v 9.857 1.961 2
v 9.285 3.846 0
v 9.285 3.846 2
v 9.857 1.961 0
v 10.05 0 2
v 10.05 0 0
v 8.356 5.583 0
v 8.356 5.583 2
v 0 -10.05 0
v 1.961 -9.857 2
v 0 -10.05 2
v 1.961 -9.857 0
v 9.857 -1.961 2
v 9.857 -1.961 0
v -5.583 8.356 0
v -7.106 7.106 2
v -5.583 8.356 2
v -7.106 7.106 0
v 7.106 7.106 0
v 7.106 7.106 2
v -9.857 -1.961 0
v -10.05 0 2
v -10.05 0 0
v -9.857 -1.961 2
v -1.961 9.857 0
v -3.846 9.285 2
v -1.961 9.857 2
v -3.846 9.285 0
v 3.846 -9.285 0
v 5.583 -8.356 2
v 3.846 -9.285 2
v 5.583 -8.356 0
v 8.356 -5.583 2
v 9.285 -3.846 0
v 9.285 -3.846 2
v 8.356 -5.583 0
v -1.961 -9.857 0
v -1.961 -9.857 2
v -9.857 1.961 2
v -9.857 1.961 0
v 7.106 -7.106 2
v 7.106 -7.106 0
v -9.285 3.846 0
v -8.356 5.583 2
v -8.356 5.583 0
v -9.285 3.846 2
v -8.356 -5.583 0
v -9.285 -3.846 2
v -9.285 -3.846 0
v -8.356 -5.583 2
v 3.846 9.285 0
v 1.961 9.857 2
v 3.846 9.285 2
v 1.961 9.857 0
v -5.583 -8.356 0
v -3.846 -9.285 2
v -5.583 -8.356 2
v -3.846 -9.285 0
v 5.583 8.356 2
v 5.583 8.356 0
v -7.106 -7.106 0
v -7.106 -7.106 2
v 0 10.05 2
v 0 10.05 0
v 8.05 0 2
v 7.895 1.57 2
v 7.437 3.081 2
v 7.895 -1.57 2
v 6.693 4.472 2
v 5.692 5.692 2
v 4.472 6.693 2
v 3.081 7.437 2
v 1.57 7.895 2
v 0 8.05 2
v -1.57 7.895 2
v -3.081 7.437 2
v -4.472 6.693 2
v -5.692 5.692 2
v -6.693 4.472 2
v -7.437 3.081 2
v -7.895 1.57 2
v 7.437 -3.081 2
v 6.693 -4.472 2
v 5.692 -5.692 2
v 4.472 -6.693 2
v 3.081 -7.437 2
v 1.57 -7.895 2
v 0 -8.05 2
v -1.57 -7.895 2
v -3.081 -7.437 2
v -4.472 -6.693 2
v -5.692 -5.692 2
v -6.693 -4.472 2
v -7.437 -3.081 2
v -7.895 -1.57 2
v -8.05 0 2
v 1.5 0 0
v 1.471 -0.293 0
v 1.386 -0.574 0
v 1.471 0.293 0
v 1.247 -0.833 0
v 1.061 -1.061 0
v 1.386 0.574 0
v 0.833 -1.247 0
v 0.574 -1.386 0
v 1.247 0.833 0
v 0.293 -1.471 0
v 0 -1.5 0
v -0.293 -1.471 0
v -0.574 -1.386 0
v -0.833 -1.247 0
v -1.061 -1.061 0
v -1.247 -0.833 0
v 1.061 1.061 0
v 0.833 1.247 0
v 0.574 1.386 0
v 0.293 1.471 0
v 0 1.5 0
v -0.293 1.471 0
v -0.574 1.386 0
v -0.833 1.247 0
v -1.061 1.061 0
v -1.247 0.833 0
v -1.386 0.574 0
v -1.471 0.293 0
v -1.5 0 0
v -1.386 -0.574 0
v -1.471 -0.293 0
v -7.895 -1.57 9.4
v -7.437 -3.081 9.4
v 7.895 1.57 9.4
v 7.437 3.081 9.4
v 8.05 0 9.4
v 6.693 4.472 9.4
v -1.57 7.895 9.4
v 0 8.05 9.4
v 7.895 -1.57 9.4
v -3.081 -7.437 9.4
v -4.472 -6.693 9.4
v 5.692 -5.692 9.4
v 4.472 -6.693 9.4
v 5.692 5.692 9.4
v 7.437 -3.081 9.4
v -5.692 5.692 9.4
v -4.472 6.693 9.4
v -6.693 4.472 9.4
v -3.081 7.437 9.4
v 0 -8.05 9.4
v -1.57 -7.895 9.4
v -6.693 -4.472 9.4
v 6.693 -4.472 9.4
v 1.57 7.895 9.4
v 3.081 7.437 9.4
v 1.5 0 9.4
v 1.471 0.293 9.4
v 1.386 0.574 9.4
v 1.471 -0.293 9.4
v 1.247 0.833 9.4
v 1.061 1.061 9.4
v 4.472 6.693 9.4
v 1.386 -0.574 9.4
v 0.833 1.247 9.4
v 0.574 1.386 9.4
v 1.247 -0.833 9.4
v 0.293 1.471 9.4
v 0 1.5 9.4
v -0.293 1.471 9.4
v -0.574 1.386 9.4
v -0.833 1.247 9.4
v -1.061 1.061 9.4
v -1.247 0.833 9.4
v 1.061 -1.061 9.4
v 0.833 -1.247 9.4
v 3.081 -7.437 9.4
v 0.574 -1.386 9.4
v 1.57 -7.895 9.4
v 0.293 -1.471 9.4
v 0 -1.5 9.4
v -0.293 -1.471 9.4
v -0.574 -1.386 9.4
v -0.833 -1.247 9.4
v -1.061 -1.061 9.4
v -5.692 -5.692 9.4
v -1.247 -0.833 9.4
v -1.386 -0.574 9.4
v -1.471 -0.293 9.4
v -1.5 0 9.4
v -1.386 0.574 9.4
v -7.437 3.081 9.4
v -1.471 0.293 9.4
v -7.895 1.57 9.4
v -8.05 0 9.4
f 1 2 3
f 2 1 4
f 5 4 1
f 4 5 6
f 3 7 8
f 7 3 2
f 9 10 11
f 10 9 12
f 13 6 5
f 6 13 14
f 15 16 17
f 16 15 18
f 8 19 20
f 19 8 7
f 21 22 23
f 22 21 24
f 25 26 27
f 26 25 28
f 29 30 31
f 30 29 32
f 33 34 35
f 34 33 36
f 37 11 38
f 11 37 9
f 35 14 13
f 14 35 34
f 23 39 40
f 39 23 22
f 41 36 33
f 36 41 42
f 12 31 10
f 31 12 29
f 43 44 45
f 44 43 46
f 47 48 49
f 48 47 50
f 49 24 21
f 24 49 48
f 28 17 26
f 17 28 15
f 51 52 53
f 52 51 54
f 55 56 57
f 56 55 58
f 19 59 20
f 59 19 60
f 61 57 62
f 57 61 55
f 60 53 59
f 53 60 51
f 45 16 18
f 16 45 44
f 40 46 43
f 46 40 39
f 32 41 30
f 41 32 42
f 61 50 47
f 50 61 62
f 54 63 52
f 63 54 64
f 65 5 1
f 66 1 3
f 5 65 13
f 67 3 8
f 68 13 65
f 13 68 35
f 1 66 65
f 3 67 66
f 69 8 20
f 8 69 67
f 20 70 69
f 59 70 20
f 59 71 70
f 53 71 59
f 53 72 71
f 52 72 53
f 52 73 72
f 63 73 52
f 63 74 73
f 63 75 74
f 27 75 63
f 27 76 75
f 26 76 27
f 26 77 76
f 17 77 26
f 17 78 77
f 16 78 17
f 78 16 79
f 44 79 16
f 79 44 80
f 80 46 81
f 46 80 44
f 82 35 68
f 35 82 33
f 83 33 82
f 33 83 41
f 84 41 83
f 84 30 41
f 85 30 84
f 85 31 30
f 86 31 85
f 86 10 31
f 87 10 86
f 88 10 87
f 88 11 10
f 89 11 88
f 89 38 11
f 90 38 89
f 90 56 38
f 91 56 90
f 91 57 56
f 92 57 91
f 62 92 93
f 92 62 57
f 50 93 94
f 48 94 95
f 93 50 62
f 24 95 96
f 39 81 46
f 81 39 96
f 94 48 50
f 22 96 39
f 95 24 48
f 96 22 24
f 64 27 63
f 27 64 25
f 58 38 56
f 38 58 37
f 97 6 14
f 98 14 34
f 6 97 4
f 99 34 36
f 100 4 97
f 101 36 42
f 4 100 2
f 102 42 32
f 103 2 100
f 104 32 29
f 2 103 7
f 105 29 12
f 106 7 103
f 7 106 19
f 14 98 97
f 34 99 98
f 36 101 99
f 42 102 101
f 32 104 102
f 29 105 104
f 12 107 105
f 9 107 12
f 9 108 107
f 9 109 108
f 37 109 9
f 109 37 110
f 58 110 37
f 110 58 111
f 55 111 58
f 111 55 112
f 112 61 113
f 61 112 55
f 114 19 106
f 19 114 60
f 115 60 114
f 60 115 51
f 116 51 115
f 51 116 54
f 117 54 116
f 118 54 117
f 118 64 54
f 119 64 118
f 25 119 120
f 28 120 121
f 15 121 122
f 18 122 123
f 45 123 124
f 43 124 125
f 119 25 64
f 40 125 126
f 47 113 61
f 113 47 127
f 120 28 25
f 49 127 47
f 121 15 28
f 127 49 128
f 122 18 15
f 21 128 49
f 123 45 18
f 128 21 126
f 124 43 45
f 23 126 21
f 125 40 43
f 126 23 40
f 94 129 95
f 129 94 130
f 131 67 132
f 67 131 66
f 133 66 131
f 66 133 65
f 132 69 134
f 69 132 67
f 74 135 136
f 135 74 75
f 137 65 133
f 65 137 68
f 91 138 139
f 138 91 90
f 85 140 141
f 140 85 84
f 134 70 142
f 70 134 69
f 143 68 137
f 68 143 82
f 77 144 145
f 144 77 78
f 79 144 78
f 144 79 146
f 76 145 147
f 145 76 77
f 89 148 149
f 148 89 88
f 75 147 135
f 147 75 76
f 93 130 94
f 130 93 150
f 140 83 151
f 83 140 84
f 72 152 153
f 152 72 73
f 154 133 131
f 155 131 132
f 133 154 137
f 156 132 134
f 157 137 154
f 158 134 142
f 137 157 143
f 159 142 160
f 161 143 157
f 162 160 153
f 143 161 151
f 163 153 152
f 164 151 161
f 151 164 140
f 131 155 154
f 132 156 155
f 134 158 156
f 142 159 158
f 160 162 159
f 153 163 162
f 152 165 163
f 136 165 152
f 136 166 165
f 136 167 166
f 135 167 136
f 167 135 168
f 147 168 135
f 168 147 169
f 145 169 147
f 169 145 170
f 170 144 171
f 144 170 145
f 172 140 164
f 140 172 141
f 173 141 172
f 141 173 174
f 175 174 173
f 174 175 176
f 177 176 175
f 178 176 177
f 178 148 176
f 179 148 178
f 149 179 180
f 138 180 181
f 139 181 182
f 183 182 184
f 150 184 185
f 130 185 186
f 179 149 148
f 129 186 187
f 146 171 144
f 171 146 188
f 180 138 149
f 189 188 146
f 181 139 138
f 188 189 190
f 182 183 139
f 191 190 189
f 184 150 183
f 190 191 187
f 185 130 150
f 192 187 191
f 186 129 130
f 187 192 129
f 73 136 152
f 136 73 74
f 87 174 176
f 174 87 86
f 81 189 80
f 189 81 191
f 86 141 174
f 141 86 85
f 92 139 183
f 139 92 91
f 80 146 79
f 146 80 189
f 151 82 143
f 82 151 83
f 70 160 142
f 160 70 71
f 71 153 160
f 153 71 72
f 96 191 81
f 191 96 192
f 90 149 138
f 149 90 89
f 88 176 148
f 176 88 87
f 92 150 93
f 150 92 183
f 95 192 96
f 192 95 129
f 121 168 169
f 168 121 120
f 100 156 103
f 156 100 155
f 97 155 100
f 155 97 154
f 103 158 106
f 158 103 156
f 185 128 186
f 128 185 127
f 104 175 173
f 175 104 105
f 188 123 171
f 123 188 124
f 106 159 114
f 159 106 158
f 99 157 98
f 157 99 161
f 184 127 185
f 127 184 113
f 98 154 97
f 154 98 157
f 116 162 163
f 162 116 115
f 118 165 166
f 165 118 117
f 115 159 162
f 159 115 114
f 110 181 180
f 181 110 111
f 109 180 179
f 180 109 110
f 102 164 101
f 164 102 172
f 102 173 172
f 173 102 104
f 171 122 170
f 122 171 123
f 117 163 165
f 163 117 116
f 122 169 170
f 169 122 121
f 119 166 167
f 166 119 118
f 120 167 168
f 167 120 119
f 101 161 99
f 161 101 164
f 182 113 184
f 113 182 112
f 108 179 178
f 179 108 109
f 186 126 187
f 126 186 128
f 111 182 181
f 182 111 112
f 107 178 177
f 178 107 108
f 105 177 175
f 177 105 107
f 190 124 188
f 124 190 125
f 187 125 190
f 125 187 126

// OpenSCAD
// file: oem/generic/third_party/shortcuts.scad
// ShortCuts.scad 
// Autor: Rudolf Huttary, Berlin 2015
//
$fn = 100; 


//show_examples(); 

module show_examples()
	place_in_rect(30, 30)
	{
		Cy(h = 10); 
		CyH(h = 10); 
		CyH(h = 10, w = 30); 
		CyS(h = 10); 
		CyS(h = 10, w1 = 25, w2 = 75); 
		Cu(10); 
		Ri(h = 10); 
		RiH(h = 10); 
		RiS(h = 10, w1 = 10); 
		RiS(h = 10, w1 = 30, w2 = 300); 
		Sp(); 
		SpH(10, 30, 30); 
	}



module help()
{
echo("==============="); 
echo("help(): shows this help"); 
echo("show_examples(): shows some examples"); 
echo("place_in_rect(): places children objects in grid"); 
echo("Transformations:"); 
echo(" transform :  T(x=0, y=0, z=0), Tx(x=0) , Ty(y=0), Tz(z=0)"); 
echo(" rotate :  R(x=0, y=0, z=0), Rx(x=0) , Ry(y=0), Rz(z=0)"); 
echo(" scale :  S(x=1, y=1, z=1), Sx(x=1) , Sy(y=1), Sz(z=1)"); 
echo("Logical"); 
echo(" difference :  D()"); 
echo(" union :  U()"); 
echo(" intersection : *missing*"); 
echo("Primitives"); 
echo(" circle :  Ci(r=10)"); 
echo(" circle_half :  CiH(r=10, w=0)")
echo(" circle_segment :  CiS(r=10, w1=0, w2=90)")
echo(" square :  Sq(x=10, y=0, center=true))"); 
echo(" cylinder :  Cy(r=10, h=1, center=true)"); 
echo(" cylinder_half :  CyH(r=10, w=0)")
echo(" cylinder_segment: CyS(r=10, h=1, w1=0, w2=90,center=true)"); 
echo(" cylinder_segment: Pie(r=10, h=1, w1=0, w2=90,center=true)"); 
echo(" cube :  Cu(x=10, y=0, z=10, center=true)"); 
echo(" ring :  Ri(R=10, r=5, h=1, center=true)"); 
echo(" ring_half :  RiH(R=10, r=5, h=1, w=0 center=true)"); 
echo(" ring_segment :  RiS(R=10, r=5, h=1, w1=0, w2=90, center=true)"); 
echo(" sphere:  Sp(r=10))"); 
echo(" sphere_half:  SpH(r=10, w1 = 0, w2 = 0))"); 
echo("==============="); 
}


// Euclidean Transformations

module T(x=0, y=0, z=0){translate([x, y, z])children(); }
module Tx(x) { translate([x, 0, 0])children(); }
module Ty(y) { translate([0, y, 0])children(); }
module Tz(z) { translate([0, 0, z])children(); }


module R(x=0, y=0, z=0){rotate([x, y, z]) children();}
module Rx(x=90){rotate([x, 0, 0]) children();}
module Ry(y=90){rotate([0, y, 0]) children();}
module Rz(z=90){rotate([0, 0, z]) children();}

module S(x=1, y=1, z=1){scale([x, y, z]) children();}
module Sx(x=1){scale([x, 1, 1]) children();}
module Sy(y=1){scale([1, y, 1]) children();}
module Sz(z=1){scale([1, 1, z]) children();}


module D() difference(){children(0); children([1:$children-1]);}
module U() children([0:$children-1]);
// module I() intersection()children([0:$children-1]); // does not work for some reason


// primitives - 2D

module Sq(x =10, y = 0, center = true)
{
   if(y==0)
		square([x, x], center = center); 
	else
		square([x, y], center = center); 
}
module Ci(r = 10)
{
	circle(r = r); 
}

// derived primitives - 2d
module CiH(r = 10, w = 0)
  circle_half(r, w); 

module CiS(r = 10, w1 = 0, w2 = 90)
  circle_segment(r, w1, w2); 


// primitives - 3d
module Cy(r = 10, h = 1, center = true)
{
	cylinder(r = r, h = h, center = center); 
}
module Cu(x = 10, y = 0, z = 10, center = true)
{
  if (y==0)
	cube([x, x, x], center = center); 
  else
	cube([x, y, z], center = center); 
}

// derived primitives - 3d
module CyH(r = 10, h = 1, w = 0, center = true)
  cylinder_half(r, h, w, center); 

module CyS(r = 10, h = 1, w1 = 0, w2 = 90, center = true)
  cylinder_segment(r, h, w1, w2, center); 

module Ri(R = 10, r = 5, h = 1, center = true)
  ring(R, r, h, center); 

module RiS(R = 10, r = 5, h = 1, w1 = 0, w2 = 90, center = true)
   ring_segment(R, r, h, w1, w2, center); 

module RiH(r1 = 10, r2, h = 1, w = 0, center = true)
   ring_half(r1, r2, h, w, center); 
module Pie(r = 10, h = 1, w1 = 0, w2 = 90, center = true)
  cylinder_segment(r, h, w1, w2, center);  
module Sp(r = 10)
  sphere(r); 
module SpH(r = 10, w1 = 0, w2 = 0)
  sphere_half(r, w1, w2); 
module SpS(r = 10, w1 = 0, w2 = 90, w3 = 90)
  sphere_segment(r, w1, w2); 




// clear text definitions
module circle_half(r = 10, w = 0)
{
	difference()
	{
		circle(r); 
     rotate([0, 0, w-90])
     translate([0, -r])
		square([r, 2*r], center = false); 
	}
}

module circle_segment(r = 10, w1 = 0, w2 = 90)
{
  W2 = (w1>w2)?w2+360:w2; 
  if (W2-w1 < 180)
    intersection()
		{
       circle_half(r, w1); 
       circle_half(r, W2-180); 
 		}
	else
    union()
		{
       circle_half(r, w1); 
       circle_half(r, W2-180); 
 		}
}

module cylinder_half(r = 10, h = 1, w = 0, center = true)
{
  linear_extrude(height = h, center = center)
  circle_half(r, w); 
} 

module cylinder_segment(r = 10, h = 1, w1 = 0, w2 = 90, center = true)
{
  linear_extrude(height = h, center = center)
  circle_segment(r, w1, w2); 
} 

module ring(R = 10, r = 5, h = 1, center = true)
{
	difference()
	{
	cylinder(r = R, h = h, center = center); 
   translate([0, 0, -2*h])
	cylinder(r = r, h = 4*h, center = false); 
	}
}

module ring_half(R = 10, r = 5, h = 1, w = 0, center = true)
{
	difference()
	{
		ring(R, r, h, center); 
     rotate([0, 0, w])
     translate([0, -R/2, 0])
		cube([2*R, R, 3*h], center = true); 
	}
}

module ring_segment(R = 10, r = 5, h = 1, w1 = 0, w2 = 90, center = true)
{
  W2 = (w1>w2)?w2+360:w2; 
  if (W2-w1 < 180)
    intersection()
		{
       ring_half(R, r, h, w1, center); 
       ring_half(R, r, h, W2-180, center); 
 		}
	else
    union()
		{
       ring_half(R, r, h, w1, center); 
       ring_half(R, r, h, W2-180, center); 
 		}
}


module sphere_half(r = 10, w1 = 0, w2 = 0)
{  
	difference()
	{
   	sphere(r); 
      rotate([-w1, -w2, 0])
     	translate([0, 0, r])
		cube(2*r, 2*r, r, center = true); 
	}

}


// additional code
module place_in_rect(dx =20, dy=20)
{
  cols = ceil(sqrt($children)); 
  rows = floor(sqrt($children)); 
  for(i = [0:$children-1])
	{ 
	  T(dx*(-cols/2+(i%cols)+.5), dy*(rows/2-floor(i/cols)-.5))
		 children(i); 
	}
}
// file: oem/generic/third_party/springs.scad
include <shortcuts.scad>  // http://www.thingiverse.com/thing:644830
$fn = 100;
help();
//examples();  // slow!! F6 takes hours!
module examples()
{
place_in_rect(60, 60)
{
// examples spring:
	spring(Windings = 7, R = 10, r = 1, h = 20);  // clockwise
	R(90) spring(Windings = 3, R = 12, r = 2, h = -60); // ccw

// examples helicoils:
	helicoil(Windings = 10);  // square wire
	helicoil(clockwise = false, square = true);  // ccw + round wire

// examples elliptic rings:
	elliptic_ring(10, 5, 1);
	elliptic_ring(10, 10, 1);  // non elliptic
	elliptic_ring(h = 10);  // element of a spring
	elliptic_ring(h = 10, w = 240);  // partial ring

// example chain:
	U()
	{
	 Rx(90) T(15) elliptic_ring(); 
	 elliptic_ring(); 
	 Rx(90) T(-15) elliptic_ring(); 
	}
}
}

module help()
{
	echo("===== springs.scad - signatures [by Rudolf Huttary, Berlin] ===="); 
	echo("elliptic_ring(r1 = 10, r2 = 5, r = 2, slices = 100, h = 0, w = 360)
"); 
	echo("helicoil(Windings = 5, R = 20, r = 1, slices = 50, clockwise = true, square = true)"); 
	echo("spring(Windings = 5, R = 20, r=2, h = 20, slices = 50)"); 
	echo("elliptic_spring(Windings = 5, R1 = 20, R2 = 0, r=1, h = 20, slices = 50)"); 
	echo("===== springs.scad - end ===="); 
}


module elliptic_ring(r1 = 10, r2 = 5, r = 2, slices = 100, h = 0, w = 360)
{
	dz = h/slices; 
   dwx = atan(h/(r1+r2)/PI); 
	for (i = [0:slices-1])
	hull()
	{
		T(r1*cos((i+1)*w/slices), r2*sin((i+1)*w/slices), (i+1)*dz)
	   R(90+dwx, 0, (i+1)*w/slices)
		Cy(r = r, h = .01); 
	
		T(r1*cos((i)*w/slices), r2*sin((i)*w/slices), i*dz)
	   R(90+dwx, 0, i*w/slices)
		Cy(r = r, h = .01); 
	}
}

module helicoil(Windings = 5, R = 20, r = 1, slices = 50, clockwise = true, square = true)
{
  $fn = square? 4 :$fn; 
  h = clockwise?Windings*2*r:-Windings*2*r; 
  spring(Windings, R, r, h, slices); 
  T((.5*R)/2, r)
  Ry(90 )
  Cy(r, 1.5*R); 
}

module spring(Windings = 5, R = 20, r=2, h = 20, slices = 50)
	elliptic_spring(Windings, R, 0, r, h, slices); 

module elliptic_spring(Windings = 5, R1 = 20, R2 = 0, r=1, h = 20, slices = 50)
{
   dh = h/Windings;   
   r2 = (R2==0)?R1:R2; 
	for(j = [0:Windings-1])
		Tz(j*dh)
		elliptic_ring(R1, r2, r, slices, dh); 
}
// file: oem/generic/lib.scad
$fn = 32;

kEpsilon = 1e-1;

function property(table, key) = table[search([key], table)[0]][1];

module sector(radius, angles, fn = $fn) {
     r = radius / cos(180 / fn);
     step = -360 / fn;

     points = concat([[0, 0]],
                     [for(a = [angles[0] : step : angles[1] - 360])
                               [r * cos(a), r * sin(a)]
                          ],
                     [[r * cos(angles[1]), r * sin(angles[1])]]
          );

     difference() {
          circle(radius, $fn = fn);
          polygon(points);
     }
}

module ring(inner_radius, outer_radius, angles = [0, 360], fn = $fn) {
     difference() {
          sector(radius=outer_radius, angles=angles, fn=fn);
          sector(radius=inner_radius, angles=angles+[-kEpsilon, kEpsilon], fn=fn);
     }
}

module rounded_ring(inner_radius, outer_radius, angles = [0, 360], fn = $fn) {
     step_angle = 360 / fn;
     ring_width = outer_radius - inner_radius;
     ring_mean_radius = (outer_radius + inner_radius) / 2;
     for (theta = angles) {
          theta_d = theta / step_angle;
          theta_frac = (theta_d - floor(theta_d) - 0.5) * step_angle;
          rho = ring_mean_radius * cos(step_angle/2) / cos(theta_frac);
          rotate(theta)
          translate([rho, 0])
          circle(d=ring_width);
     }
     ring(inner_radius=inner_radius,
          outer_radius=outer_radius,
          angles=angles, fn=fn);
}

module fillet(r) {
     difference() {
          difference() {
               offset(r=-r - kEpsilon)
                    offset(delta=r) {
                    children();
               }
               offset(r=r)
                    offset(delta=-r) {
                    children();
               }
          }
          children();
     }
     offset(r=r)
          offset(delta=-r) {
          children();
     }
}

module bench_fillet(r, order=1000) {
     difference() {
          fillet(r) {
               translate([-order/2-kEpsilon, 0]) {
                    square([order, order], center=true);
               }
               children();
          }
          translate([-order/2-kEpsilon, 0]) {
               square([order+kEpsilon, order+kEpsilon], center=true);
          }
     }
}

module curved_bench_fillet(r, bench_radius, order=1000, internal=true) {
     difference() {
          fillet(r) {
               if (internal) {
                    translate([bench_radius, 0]) {
                         ring(inner_radius=bench_radius + kEpsilon, outer_radius=bench_radius * order);
                    }
               } else {
                    translate([-bench_radius, 0]) circle(r=bench_radius - kEpsilon);
               }
               children();
          }
          if (internal) {
               translate([bench_radius, 0]) {
                    ring(inner_radius=bench_radius,
                         outer_radius=bench_radius * order - kEpsilon);
               }
          } else {
               translate([-bench_radius, 0]) circle(r=bench_radius);
          }

     }
}


module window(side, position=[0, 0, 0], order=1000) {
    difference() {
        children();
        translate(position)  {
            difference() {
                square(order, center=true);
                square(side, center=true);
            }
        }
    }
}


module rounded_cylinder(diameter, height, fillet_radius, center) {
     translate([0, 0, ! center ? height/2 : 0]) {
          minkowski() {
               cylinder(d=(diameter - 2 * fillet_radius),
                        h=(height - 2 * fillet_radius),
                        center=true);
               sphere(r=fillet_radius);
          }
     }
}


module curved_support_xsection(support_radius, fillet_radius,
                               wall_inner_radius, wall_outer_radius,
                               hole_radius = 0, internal=true) {
     support_angular_width = (4 * support_radius / wall_outer_radius) * 180 / PI;
     wall_thickness = wall_outer_radius - wall_inner_radius;
     rotate([0, 0, internal ? 180 : 0]) {
          difference() {
               window(6*support_radius) {
                    curved_bench_fillet(fillet_radius, bench_radius=wall_inner_radius, internal=internal) {
                         hull() {
                              translate([support_radius + wall_thickness/2, 0]) {
                                   circle(r=support_radius);
                              }
                              rotate([0, 0, ! internal ? 180 : 0])
                              translate([wall_inner_radius + wall_thickness/2, 0]) {
                                   ring(inner_radius=wall_inner_radius,
                                        outer_radius=wall_outer_radius,
                                        angles=[180 - support_angular_width/2,
                                                180 + support_angular_width/2]);
                              }
                         }
                         rotate([0, 0, ! internal ? 180 : 0])
                         translate([wall_inner_radius + wall_thickness/2, 0]) {
                              ring(inner_radius=wall_inner_radius,
                                   outer_radius=wall_outer_radius,
                                   angles=[180 - support_angular_width,
                                           180 + support_angular_width]);
                         }
                    }
               }
               if (hole_radius > 0) {
                    translate([support_radius + wall_thickness/2, 0]) {
                         circle(r=hole_radius);
                    }
               }
          }
     }
}

module fill(upto=1000) {
     offset(delta=-upto) {
          offset(delta=upto) {
               children();
          }
     }
}

module outline(delta) {
     if (delta > 0) {
          difference() {
               offset(delta=delta) {
                    children();
               }
               children();
          }
     } else {
          difference() {
               children();
               offset(delta=delta) {
                    children();
               }
          }
     }
}

module duplicate(v) {
     children();
     mirror(v) children();
}

function steps(start, end, n) = [start:(end - start)/(n - 1):end];

function sigmoid(x) = 1.0 / (1.0 + exp(-x));

module sigmoid_profile(length, width, order=10, fn = $fn) {
     step = length / fn;
     points = concat(
          [[0, 0]],
          [for (x = [step:step:length-step]) [x, width * sigmoid(2 * order * ((x / length) - 0.5))]],
          [[length, width], [0, width]]

     );
     polygon(points=points);
}

module exp_nerve_xsection(height, length, decay_rate = 5, fn = $fn) {
     step = length / fn;
     points = concat(
          [[0, 0]],
          [for (x = [0:step:length-step]) [x, height * exp(-x/decay_rate)]],
          [[length, 0]]
          );
     polygon(points=points);
}

module exp_nerve(height, length, thickness, decay_rate = 3, fn = $fn) {
     rotate([90, 0, 0])
     linear_extrude(height=thickness, center=true) {
          exp_nerve_xsection(height, length, decay_rate, fn);
     }
}

module exp_corner_nerve(height, radius, angles, corner_radius = 0, decay_rate = 3, fn = $fn) {
     difference() {
          rotate_extrude() {
               if (corner_radius > 0) {
                    translate([corner_radius, 0, 0])
                    exp_nerve_xsection(height=height, length=radius, decay_rate=decay_rate, fn=fn);
               } else {
                    translate([-corner_radius, 0, 0])
                    mirror([1, 0, 0])
                    exp_nerve_xsection(height=height, length=radius, decay_rate=decay_rate, fn=fn);
               }
          }
          linear_extrude(height=2 * height, center=true) {
               sector(radius=radius + abs(corner_radius), angles=[angles[1], angles[0] + 360], fn=fn);
          }
     }
}
// file: oem/m3_nut.scad
function vM3NutDatasheet() =
     [["e_min", 6.01], ["s_max", 5.5], ["m_max", 2.4]];



module mM3Nut() {
     import("stl/din934_m3_nut.stl");
}

mM3Nut();
// file: oem/m3x5mm_threaded_insert.scad
include <generic/lib.scad>;

function vM3x5mmThreadedInsertDatasheet() =
     let(major_diameter=5.31)
     [["major_diameter", major_diameter],
      ["minor_diameter", major_diameter - 0.5],
      ["nominal_diameter", 3], ["length", 5]];

module mM3x5mmThreadedInsertTaperCone() {
     datasheet = vM3x5mmThreadedInsertDatasheet();
     translate([0, 0, -property(datasheet, "length")])
     cylinder(d1=property(datasheet, "minor_diameter"),
              d2=property(datasheet, "major_diameter"),
              h=property(datasheet, "length") + kEpsilon);
}

module mM3x5mmThreadedInsert() {
     import("stl/m3x5mm_threaded_insert.stl");
}

mM3x5mmThreadedInsert();
// file: oem/f2276_sae1070_spring.scad
include <generic/lib.scad>;

use <generic/third_party/springs.scad>

function vF2276SAE1070SpringDatasheet() =
     let(wire_diameter=1, outer_diameter=18.1,
         inner_diameter=outer_diameter-2*wire_diameter,
         n_windings=8, free_length=43)
     [["outer_diameter", outer_diameter],
      ["inner_diameter", inner_diameter],
      ["wire_diameter", wire_diameter],
      ["pitch", free_length/n_windings],
      ["n_windings", n_windings],
      ["free_length", free_length]];

kF2276SAE1070SpringLength = property(vF2276SAE1070SpringDatasheet(), "free_length");

module mF2276SAE1070Spring(length=kF2276SAE1070SpringLength) {
     assert(length > 0);
     assert(length <= kF2276SAE1070SpringLength);

     datasheet = vF2276SAE1070SpringDatasheet();
     n_windings = property(datasheet, "n_windings");
     main_radius = (property(datasheet, "outer_diameter") +
                    property(datasheet, "inner_diameter")) / 4;
     wire_radius = property(datasheet, "wire_diameter") / 2;

     translate([0, 0, wire_radius])
     spring(Windings=n_windings, R=main_radius, r=wire_radius, h=length - 2 * wire_radius, slices=50);
}

mF2276SAE1070Spring();
// main file
include <generic/lib.scad>;

use <oem/f2276_sae1070_spring.scad>;
use <oem/m3x5mm_threaded_insert.scad>;
use <oem/m3_nut.scad>;


function v50mmBallCasterSpringSeatDatasheet() =
     let(nut_datasheet = vM3NutDatasheet(),
         spring_datasheet=vF2276SAE1070SpringDatasheet(),
         nut_m_max=property(nut_datasheet, "m_max"),
         threaded_insert_datasheet=vM3x5mmThreadedInsertDatasheet(),
         threaded_insert_length=property(threaded_insert_datasheet, "length"),
         spring_outer_diameter=property(spring_datasheet, "outer_diameter"),
         spring_inner_diameter=property(spring_datasheet, "inner_diameter"),
         spring_wire_diameter=property(spring_datasheet, "wire_diameter"),
         spring_pitch=property(spring_datasheet, "pitch"), base_thickness=2)
     [["base_thickness", base_thickness],
      ["inner_diameter", spring_inner_diameter],
      ["outer_diameter", spring_outer_diameter + 2 * spring_wire_diameter],
      ["height", base_thickness + max(threaded_insert_length + nut_m_max, spring_pitch)]];


module m50mmBallCasterSpringSeat() {
     datasheet = v50mmBallCasterSpringSeatDatasheet();
     base_thickness = property(datasheet, "base_thickness");
     outer_diameter = property(datasheet, "outer_diameter");
     inner_diameter = property(datasheet, "inner_diameter");
     height = property(datasheet, "height");

     difference() {
          union() {
               cylinder(d=outer_diameter, h=base_thickness);
               cylinder(d=inner_diameter, h=height);
          }
          let(hole_diameter=property(vM3x5mmThreadedInsertDatasheet(), "nominal_diameter")) {
               translate([0, 0, -kEpsilon]) {
                    cylinder(d=hole_diameter, h=height + 2 * kEpsilon);
               }
          }
     }
}


m50mmBallCasterSpringSeat();
